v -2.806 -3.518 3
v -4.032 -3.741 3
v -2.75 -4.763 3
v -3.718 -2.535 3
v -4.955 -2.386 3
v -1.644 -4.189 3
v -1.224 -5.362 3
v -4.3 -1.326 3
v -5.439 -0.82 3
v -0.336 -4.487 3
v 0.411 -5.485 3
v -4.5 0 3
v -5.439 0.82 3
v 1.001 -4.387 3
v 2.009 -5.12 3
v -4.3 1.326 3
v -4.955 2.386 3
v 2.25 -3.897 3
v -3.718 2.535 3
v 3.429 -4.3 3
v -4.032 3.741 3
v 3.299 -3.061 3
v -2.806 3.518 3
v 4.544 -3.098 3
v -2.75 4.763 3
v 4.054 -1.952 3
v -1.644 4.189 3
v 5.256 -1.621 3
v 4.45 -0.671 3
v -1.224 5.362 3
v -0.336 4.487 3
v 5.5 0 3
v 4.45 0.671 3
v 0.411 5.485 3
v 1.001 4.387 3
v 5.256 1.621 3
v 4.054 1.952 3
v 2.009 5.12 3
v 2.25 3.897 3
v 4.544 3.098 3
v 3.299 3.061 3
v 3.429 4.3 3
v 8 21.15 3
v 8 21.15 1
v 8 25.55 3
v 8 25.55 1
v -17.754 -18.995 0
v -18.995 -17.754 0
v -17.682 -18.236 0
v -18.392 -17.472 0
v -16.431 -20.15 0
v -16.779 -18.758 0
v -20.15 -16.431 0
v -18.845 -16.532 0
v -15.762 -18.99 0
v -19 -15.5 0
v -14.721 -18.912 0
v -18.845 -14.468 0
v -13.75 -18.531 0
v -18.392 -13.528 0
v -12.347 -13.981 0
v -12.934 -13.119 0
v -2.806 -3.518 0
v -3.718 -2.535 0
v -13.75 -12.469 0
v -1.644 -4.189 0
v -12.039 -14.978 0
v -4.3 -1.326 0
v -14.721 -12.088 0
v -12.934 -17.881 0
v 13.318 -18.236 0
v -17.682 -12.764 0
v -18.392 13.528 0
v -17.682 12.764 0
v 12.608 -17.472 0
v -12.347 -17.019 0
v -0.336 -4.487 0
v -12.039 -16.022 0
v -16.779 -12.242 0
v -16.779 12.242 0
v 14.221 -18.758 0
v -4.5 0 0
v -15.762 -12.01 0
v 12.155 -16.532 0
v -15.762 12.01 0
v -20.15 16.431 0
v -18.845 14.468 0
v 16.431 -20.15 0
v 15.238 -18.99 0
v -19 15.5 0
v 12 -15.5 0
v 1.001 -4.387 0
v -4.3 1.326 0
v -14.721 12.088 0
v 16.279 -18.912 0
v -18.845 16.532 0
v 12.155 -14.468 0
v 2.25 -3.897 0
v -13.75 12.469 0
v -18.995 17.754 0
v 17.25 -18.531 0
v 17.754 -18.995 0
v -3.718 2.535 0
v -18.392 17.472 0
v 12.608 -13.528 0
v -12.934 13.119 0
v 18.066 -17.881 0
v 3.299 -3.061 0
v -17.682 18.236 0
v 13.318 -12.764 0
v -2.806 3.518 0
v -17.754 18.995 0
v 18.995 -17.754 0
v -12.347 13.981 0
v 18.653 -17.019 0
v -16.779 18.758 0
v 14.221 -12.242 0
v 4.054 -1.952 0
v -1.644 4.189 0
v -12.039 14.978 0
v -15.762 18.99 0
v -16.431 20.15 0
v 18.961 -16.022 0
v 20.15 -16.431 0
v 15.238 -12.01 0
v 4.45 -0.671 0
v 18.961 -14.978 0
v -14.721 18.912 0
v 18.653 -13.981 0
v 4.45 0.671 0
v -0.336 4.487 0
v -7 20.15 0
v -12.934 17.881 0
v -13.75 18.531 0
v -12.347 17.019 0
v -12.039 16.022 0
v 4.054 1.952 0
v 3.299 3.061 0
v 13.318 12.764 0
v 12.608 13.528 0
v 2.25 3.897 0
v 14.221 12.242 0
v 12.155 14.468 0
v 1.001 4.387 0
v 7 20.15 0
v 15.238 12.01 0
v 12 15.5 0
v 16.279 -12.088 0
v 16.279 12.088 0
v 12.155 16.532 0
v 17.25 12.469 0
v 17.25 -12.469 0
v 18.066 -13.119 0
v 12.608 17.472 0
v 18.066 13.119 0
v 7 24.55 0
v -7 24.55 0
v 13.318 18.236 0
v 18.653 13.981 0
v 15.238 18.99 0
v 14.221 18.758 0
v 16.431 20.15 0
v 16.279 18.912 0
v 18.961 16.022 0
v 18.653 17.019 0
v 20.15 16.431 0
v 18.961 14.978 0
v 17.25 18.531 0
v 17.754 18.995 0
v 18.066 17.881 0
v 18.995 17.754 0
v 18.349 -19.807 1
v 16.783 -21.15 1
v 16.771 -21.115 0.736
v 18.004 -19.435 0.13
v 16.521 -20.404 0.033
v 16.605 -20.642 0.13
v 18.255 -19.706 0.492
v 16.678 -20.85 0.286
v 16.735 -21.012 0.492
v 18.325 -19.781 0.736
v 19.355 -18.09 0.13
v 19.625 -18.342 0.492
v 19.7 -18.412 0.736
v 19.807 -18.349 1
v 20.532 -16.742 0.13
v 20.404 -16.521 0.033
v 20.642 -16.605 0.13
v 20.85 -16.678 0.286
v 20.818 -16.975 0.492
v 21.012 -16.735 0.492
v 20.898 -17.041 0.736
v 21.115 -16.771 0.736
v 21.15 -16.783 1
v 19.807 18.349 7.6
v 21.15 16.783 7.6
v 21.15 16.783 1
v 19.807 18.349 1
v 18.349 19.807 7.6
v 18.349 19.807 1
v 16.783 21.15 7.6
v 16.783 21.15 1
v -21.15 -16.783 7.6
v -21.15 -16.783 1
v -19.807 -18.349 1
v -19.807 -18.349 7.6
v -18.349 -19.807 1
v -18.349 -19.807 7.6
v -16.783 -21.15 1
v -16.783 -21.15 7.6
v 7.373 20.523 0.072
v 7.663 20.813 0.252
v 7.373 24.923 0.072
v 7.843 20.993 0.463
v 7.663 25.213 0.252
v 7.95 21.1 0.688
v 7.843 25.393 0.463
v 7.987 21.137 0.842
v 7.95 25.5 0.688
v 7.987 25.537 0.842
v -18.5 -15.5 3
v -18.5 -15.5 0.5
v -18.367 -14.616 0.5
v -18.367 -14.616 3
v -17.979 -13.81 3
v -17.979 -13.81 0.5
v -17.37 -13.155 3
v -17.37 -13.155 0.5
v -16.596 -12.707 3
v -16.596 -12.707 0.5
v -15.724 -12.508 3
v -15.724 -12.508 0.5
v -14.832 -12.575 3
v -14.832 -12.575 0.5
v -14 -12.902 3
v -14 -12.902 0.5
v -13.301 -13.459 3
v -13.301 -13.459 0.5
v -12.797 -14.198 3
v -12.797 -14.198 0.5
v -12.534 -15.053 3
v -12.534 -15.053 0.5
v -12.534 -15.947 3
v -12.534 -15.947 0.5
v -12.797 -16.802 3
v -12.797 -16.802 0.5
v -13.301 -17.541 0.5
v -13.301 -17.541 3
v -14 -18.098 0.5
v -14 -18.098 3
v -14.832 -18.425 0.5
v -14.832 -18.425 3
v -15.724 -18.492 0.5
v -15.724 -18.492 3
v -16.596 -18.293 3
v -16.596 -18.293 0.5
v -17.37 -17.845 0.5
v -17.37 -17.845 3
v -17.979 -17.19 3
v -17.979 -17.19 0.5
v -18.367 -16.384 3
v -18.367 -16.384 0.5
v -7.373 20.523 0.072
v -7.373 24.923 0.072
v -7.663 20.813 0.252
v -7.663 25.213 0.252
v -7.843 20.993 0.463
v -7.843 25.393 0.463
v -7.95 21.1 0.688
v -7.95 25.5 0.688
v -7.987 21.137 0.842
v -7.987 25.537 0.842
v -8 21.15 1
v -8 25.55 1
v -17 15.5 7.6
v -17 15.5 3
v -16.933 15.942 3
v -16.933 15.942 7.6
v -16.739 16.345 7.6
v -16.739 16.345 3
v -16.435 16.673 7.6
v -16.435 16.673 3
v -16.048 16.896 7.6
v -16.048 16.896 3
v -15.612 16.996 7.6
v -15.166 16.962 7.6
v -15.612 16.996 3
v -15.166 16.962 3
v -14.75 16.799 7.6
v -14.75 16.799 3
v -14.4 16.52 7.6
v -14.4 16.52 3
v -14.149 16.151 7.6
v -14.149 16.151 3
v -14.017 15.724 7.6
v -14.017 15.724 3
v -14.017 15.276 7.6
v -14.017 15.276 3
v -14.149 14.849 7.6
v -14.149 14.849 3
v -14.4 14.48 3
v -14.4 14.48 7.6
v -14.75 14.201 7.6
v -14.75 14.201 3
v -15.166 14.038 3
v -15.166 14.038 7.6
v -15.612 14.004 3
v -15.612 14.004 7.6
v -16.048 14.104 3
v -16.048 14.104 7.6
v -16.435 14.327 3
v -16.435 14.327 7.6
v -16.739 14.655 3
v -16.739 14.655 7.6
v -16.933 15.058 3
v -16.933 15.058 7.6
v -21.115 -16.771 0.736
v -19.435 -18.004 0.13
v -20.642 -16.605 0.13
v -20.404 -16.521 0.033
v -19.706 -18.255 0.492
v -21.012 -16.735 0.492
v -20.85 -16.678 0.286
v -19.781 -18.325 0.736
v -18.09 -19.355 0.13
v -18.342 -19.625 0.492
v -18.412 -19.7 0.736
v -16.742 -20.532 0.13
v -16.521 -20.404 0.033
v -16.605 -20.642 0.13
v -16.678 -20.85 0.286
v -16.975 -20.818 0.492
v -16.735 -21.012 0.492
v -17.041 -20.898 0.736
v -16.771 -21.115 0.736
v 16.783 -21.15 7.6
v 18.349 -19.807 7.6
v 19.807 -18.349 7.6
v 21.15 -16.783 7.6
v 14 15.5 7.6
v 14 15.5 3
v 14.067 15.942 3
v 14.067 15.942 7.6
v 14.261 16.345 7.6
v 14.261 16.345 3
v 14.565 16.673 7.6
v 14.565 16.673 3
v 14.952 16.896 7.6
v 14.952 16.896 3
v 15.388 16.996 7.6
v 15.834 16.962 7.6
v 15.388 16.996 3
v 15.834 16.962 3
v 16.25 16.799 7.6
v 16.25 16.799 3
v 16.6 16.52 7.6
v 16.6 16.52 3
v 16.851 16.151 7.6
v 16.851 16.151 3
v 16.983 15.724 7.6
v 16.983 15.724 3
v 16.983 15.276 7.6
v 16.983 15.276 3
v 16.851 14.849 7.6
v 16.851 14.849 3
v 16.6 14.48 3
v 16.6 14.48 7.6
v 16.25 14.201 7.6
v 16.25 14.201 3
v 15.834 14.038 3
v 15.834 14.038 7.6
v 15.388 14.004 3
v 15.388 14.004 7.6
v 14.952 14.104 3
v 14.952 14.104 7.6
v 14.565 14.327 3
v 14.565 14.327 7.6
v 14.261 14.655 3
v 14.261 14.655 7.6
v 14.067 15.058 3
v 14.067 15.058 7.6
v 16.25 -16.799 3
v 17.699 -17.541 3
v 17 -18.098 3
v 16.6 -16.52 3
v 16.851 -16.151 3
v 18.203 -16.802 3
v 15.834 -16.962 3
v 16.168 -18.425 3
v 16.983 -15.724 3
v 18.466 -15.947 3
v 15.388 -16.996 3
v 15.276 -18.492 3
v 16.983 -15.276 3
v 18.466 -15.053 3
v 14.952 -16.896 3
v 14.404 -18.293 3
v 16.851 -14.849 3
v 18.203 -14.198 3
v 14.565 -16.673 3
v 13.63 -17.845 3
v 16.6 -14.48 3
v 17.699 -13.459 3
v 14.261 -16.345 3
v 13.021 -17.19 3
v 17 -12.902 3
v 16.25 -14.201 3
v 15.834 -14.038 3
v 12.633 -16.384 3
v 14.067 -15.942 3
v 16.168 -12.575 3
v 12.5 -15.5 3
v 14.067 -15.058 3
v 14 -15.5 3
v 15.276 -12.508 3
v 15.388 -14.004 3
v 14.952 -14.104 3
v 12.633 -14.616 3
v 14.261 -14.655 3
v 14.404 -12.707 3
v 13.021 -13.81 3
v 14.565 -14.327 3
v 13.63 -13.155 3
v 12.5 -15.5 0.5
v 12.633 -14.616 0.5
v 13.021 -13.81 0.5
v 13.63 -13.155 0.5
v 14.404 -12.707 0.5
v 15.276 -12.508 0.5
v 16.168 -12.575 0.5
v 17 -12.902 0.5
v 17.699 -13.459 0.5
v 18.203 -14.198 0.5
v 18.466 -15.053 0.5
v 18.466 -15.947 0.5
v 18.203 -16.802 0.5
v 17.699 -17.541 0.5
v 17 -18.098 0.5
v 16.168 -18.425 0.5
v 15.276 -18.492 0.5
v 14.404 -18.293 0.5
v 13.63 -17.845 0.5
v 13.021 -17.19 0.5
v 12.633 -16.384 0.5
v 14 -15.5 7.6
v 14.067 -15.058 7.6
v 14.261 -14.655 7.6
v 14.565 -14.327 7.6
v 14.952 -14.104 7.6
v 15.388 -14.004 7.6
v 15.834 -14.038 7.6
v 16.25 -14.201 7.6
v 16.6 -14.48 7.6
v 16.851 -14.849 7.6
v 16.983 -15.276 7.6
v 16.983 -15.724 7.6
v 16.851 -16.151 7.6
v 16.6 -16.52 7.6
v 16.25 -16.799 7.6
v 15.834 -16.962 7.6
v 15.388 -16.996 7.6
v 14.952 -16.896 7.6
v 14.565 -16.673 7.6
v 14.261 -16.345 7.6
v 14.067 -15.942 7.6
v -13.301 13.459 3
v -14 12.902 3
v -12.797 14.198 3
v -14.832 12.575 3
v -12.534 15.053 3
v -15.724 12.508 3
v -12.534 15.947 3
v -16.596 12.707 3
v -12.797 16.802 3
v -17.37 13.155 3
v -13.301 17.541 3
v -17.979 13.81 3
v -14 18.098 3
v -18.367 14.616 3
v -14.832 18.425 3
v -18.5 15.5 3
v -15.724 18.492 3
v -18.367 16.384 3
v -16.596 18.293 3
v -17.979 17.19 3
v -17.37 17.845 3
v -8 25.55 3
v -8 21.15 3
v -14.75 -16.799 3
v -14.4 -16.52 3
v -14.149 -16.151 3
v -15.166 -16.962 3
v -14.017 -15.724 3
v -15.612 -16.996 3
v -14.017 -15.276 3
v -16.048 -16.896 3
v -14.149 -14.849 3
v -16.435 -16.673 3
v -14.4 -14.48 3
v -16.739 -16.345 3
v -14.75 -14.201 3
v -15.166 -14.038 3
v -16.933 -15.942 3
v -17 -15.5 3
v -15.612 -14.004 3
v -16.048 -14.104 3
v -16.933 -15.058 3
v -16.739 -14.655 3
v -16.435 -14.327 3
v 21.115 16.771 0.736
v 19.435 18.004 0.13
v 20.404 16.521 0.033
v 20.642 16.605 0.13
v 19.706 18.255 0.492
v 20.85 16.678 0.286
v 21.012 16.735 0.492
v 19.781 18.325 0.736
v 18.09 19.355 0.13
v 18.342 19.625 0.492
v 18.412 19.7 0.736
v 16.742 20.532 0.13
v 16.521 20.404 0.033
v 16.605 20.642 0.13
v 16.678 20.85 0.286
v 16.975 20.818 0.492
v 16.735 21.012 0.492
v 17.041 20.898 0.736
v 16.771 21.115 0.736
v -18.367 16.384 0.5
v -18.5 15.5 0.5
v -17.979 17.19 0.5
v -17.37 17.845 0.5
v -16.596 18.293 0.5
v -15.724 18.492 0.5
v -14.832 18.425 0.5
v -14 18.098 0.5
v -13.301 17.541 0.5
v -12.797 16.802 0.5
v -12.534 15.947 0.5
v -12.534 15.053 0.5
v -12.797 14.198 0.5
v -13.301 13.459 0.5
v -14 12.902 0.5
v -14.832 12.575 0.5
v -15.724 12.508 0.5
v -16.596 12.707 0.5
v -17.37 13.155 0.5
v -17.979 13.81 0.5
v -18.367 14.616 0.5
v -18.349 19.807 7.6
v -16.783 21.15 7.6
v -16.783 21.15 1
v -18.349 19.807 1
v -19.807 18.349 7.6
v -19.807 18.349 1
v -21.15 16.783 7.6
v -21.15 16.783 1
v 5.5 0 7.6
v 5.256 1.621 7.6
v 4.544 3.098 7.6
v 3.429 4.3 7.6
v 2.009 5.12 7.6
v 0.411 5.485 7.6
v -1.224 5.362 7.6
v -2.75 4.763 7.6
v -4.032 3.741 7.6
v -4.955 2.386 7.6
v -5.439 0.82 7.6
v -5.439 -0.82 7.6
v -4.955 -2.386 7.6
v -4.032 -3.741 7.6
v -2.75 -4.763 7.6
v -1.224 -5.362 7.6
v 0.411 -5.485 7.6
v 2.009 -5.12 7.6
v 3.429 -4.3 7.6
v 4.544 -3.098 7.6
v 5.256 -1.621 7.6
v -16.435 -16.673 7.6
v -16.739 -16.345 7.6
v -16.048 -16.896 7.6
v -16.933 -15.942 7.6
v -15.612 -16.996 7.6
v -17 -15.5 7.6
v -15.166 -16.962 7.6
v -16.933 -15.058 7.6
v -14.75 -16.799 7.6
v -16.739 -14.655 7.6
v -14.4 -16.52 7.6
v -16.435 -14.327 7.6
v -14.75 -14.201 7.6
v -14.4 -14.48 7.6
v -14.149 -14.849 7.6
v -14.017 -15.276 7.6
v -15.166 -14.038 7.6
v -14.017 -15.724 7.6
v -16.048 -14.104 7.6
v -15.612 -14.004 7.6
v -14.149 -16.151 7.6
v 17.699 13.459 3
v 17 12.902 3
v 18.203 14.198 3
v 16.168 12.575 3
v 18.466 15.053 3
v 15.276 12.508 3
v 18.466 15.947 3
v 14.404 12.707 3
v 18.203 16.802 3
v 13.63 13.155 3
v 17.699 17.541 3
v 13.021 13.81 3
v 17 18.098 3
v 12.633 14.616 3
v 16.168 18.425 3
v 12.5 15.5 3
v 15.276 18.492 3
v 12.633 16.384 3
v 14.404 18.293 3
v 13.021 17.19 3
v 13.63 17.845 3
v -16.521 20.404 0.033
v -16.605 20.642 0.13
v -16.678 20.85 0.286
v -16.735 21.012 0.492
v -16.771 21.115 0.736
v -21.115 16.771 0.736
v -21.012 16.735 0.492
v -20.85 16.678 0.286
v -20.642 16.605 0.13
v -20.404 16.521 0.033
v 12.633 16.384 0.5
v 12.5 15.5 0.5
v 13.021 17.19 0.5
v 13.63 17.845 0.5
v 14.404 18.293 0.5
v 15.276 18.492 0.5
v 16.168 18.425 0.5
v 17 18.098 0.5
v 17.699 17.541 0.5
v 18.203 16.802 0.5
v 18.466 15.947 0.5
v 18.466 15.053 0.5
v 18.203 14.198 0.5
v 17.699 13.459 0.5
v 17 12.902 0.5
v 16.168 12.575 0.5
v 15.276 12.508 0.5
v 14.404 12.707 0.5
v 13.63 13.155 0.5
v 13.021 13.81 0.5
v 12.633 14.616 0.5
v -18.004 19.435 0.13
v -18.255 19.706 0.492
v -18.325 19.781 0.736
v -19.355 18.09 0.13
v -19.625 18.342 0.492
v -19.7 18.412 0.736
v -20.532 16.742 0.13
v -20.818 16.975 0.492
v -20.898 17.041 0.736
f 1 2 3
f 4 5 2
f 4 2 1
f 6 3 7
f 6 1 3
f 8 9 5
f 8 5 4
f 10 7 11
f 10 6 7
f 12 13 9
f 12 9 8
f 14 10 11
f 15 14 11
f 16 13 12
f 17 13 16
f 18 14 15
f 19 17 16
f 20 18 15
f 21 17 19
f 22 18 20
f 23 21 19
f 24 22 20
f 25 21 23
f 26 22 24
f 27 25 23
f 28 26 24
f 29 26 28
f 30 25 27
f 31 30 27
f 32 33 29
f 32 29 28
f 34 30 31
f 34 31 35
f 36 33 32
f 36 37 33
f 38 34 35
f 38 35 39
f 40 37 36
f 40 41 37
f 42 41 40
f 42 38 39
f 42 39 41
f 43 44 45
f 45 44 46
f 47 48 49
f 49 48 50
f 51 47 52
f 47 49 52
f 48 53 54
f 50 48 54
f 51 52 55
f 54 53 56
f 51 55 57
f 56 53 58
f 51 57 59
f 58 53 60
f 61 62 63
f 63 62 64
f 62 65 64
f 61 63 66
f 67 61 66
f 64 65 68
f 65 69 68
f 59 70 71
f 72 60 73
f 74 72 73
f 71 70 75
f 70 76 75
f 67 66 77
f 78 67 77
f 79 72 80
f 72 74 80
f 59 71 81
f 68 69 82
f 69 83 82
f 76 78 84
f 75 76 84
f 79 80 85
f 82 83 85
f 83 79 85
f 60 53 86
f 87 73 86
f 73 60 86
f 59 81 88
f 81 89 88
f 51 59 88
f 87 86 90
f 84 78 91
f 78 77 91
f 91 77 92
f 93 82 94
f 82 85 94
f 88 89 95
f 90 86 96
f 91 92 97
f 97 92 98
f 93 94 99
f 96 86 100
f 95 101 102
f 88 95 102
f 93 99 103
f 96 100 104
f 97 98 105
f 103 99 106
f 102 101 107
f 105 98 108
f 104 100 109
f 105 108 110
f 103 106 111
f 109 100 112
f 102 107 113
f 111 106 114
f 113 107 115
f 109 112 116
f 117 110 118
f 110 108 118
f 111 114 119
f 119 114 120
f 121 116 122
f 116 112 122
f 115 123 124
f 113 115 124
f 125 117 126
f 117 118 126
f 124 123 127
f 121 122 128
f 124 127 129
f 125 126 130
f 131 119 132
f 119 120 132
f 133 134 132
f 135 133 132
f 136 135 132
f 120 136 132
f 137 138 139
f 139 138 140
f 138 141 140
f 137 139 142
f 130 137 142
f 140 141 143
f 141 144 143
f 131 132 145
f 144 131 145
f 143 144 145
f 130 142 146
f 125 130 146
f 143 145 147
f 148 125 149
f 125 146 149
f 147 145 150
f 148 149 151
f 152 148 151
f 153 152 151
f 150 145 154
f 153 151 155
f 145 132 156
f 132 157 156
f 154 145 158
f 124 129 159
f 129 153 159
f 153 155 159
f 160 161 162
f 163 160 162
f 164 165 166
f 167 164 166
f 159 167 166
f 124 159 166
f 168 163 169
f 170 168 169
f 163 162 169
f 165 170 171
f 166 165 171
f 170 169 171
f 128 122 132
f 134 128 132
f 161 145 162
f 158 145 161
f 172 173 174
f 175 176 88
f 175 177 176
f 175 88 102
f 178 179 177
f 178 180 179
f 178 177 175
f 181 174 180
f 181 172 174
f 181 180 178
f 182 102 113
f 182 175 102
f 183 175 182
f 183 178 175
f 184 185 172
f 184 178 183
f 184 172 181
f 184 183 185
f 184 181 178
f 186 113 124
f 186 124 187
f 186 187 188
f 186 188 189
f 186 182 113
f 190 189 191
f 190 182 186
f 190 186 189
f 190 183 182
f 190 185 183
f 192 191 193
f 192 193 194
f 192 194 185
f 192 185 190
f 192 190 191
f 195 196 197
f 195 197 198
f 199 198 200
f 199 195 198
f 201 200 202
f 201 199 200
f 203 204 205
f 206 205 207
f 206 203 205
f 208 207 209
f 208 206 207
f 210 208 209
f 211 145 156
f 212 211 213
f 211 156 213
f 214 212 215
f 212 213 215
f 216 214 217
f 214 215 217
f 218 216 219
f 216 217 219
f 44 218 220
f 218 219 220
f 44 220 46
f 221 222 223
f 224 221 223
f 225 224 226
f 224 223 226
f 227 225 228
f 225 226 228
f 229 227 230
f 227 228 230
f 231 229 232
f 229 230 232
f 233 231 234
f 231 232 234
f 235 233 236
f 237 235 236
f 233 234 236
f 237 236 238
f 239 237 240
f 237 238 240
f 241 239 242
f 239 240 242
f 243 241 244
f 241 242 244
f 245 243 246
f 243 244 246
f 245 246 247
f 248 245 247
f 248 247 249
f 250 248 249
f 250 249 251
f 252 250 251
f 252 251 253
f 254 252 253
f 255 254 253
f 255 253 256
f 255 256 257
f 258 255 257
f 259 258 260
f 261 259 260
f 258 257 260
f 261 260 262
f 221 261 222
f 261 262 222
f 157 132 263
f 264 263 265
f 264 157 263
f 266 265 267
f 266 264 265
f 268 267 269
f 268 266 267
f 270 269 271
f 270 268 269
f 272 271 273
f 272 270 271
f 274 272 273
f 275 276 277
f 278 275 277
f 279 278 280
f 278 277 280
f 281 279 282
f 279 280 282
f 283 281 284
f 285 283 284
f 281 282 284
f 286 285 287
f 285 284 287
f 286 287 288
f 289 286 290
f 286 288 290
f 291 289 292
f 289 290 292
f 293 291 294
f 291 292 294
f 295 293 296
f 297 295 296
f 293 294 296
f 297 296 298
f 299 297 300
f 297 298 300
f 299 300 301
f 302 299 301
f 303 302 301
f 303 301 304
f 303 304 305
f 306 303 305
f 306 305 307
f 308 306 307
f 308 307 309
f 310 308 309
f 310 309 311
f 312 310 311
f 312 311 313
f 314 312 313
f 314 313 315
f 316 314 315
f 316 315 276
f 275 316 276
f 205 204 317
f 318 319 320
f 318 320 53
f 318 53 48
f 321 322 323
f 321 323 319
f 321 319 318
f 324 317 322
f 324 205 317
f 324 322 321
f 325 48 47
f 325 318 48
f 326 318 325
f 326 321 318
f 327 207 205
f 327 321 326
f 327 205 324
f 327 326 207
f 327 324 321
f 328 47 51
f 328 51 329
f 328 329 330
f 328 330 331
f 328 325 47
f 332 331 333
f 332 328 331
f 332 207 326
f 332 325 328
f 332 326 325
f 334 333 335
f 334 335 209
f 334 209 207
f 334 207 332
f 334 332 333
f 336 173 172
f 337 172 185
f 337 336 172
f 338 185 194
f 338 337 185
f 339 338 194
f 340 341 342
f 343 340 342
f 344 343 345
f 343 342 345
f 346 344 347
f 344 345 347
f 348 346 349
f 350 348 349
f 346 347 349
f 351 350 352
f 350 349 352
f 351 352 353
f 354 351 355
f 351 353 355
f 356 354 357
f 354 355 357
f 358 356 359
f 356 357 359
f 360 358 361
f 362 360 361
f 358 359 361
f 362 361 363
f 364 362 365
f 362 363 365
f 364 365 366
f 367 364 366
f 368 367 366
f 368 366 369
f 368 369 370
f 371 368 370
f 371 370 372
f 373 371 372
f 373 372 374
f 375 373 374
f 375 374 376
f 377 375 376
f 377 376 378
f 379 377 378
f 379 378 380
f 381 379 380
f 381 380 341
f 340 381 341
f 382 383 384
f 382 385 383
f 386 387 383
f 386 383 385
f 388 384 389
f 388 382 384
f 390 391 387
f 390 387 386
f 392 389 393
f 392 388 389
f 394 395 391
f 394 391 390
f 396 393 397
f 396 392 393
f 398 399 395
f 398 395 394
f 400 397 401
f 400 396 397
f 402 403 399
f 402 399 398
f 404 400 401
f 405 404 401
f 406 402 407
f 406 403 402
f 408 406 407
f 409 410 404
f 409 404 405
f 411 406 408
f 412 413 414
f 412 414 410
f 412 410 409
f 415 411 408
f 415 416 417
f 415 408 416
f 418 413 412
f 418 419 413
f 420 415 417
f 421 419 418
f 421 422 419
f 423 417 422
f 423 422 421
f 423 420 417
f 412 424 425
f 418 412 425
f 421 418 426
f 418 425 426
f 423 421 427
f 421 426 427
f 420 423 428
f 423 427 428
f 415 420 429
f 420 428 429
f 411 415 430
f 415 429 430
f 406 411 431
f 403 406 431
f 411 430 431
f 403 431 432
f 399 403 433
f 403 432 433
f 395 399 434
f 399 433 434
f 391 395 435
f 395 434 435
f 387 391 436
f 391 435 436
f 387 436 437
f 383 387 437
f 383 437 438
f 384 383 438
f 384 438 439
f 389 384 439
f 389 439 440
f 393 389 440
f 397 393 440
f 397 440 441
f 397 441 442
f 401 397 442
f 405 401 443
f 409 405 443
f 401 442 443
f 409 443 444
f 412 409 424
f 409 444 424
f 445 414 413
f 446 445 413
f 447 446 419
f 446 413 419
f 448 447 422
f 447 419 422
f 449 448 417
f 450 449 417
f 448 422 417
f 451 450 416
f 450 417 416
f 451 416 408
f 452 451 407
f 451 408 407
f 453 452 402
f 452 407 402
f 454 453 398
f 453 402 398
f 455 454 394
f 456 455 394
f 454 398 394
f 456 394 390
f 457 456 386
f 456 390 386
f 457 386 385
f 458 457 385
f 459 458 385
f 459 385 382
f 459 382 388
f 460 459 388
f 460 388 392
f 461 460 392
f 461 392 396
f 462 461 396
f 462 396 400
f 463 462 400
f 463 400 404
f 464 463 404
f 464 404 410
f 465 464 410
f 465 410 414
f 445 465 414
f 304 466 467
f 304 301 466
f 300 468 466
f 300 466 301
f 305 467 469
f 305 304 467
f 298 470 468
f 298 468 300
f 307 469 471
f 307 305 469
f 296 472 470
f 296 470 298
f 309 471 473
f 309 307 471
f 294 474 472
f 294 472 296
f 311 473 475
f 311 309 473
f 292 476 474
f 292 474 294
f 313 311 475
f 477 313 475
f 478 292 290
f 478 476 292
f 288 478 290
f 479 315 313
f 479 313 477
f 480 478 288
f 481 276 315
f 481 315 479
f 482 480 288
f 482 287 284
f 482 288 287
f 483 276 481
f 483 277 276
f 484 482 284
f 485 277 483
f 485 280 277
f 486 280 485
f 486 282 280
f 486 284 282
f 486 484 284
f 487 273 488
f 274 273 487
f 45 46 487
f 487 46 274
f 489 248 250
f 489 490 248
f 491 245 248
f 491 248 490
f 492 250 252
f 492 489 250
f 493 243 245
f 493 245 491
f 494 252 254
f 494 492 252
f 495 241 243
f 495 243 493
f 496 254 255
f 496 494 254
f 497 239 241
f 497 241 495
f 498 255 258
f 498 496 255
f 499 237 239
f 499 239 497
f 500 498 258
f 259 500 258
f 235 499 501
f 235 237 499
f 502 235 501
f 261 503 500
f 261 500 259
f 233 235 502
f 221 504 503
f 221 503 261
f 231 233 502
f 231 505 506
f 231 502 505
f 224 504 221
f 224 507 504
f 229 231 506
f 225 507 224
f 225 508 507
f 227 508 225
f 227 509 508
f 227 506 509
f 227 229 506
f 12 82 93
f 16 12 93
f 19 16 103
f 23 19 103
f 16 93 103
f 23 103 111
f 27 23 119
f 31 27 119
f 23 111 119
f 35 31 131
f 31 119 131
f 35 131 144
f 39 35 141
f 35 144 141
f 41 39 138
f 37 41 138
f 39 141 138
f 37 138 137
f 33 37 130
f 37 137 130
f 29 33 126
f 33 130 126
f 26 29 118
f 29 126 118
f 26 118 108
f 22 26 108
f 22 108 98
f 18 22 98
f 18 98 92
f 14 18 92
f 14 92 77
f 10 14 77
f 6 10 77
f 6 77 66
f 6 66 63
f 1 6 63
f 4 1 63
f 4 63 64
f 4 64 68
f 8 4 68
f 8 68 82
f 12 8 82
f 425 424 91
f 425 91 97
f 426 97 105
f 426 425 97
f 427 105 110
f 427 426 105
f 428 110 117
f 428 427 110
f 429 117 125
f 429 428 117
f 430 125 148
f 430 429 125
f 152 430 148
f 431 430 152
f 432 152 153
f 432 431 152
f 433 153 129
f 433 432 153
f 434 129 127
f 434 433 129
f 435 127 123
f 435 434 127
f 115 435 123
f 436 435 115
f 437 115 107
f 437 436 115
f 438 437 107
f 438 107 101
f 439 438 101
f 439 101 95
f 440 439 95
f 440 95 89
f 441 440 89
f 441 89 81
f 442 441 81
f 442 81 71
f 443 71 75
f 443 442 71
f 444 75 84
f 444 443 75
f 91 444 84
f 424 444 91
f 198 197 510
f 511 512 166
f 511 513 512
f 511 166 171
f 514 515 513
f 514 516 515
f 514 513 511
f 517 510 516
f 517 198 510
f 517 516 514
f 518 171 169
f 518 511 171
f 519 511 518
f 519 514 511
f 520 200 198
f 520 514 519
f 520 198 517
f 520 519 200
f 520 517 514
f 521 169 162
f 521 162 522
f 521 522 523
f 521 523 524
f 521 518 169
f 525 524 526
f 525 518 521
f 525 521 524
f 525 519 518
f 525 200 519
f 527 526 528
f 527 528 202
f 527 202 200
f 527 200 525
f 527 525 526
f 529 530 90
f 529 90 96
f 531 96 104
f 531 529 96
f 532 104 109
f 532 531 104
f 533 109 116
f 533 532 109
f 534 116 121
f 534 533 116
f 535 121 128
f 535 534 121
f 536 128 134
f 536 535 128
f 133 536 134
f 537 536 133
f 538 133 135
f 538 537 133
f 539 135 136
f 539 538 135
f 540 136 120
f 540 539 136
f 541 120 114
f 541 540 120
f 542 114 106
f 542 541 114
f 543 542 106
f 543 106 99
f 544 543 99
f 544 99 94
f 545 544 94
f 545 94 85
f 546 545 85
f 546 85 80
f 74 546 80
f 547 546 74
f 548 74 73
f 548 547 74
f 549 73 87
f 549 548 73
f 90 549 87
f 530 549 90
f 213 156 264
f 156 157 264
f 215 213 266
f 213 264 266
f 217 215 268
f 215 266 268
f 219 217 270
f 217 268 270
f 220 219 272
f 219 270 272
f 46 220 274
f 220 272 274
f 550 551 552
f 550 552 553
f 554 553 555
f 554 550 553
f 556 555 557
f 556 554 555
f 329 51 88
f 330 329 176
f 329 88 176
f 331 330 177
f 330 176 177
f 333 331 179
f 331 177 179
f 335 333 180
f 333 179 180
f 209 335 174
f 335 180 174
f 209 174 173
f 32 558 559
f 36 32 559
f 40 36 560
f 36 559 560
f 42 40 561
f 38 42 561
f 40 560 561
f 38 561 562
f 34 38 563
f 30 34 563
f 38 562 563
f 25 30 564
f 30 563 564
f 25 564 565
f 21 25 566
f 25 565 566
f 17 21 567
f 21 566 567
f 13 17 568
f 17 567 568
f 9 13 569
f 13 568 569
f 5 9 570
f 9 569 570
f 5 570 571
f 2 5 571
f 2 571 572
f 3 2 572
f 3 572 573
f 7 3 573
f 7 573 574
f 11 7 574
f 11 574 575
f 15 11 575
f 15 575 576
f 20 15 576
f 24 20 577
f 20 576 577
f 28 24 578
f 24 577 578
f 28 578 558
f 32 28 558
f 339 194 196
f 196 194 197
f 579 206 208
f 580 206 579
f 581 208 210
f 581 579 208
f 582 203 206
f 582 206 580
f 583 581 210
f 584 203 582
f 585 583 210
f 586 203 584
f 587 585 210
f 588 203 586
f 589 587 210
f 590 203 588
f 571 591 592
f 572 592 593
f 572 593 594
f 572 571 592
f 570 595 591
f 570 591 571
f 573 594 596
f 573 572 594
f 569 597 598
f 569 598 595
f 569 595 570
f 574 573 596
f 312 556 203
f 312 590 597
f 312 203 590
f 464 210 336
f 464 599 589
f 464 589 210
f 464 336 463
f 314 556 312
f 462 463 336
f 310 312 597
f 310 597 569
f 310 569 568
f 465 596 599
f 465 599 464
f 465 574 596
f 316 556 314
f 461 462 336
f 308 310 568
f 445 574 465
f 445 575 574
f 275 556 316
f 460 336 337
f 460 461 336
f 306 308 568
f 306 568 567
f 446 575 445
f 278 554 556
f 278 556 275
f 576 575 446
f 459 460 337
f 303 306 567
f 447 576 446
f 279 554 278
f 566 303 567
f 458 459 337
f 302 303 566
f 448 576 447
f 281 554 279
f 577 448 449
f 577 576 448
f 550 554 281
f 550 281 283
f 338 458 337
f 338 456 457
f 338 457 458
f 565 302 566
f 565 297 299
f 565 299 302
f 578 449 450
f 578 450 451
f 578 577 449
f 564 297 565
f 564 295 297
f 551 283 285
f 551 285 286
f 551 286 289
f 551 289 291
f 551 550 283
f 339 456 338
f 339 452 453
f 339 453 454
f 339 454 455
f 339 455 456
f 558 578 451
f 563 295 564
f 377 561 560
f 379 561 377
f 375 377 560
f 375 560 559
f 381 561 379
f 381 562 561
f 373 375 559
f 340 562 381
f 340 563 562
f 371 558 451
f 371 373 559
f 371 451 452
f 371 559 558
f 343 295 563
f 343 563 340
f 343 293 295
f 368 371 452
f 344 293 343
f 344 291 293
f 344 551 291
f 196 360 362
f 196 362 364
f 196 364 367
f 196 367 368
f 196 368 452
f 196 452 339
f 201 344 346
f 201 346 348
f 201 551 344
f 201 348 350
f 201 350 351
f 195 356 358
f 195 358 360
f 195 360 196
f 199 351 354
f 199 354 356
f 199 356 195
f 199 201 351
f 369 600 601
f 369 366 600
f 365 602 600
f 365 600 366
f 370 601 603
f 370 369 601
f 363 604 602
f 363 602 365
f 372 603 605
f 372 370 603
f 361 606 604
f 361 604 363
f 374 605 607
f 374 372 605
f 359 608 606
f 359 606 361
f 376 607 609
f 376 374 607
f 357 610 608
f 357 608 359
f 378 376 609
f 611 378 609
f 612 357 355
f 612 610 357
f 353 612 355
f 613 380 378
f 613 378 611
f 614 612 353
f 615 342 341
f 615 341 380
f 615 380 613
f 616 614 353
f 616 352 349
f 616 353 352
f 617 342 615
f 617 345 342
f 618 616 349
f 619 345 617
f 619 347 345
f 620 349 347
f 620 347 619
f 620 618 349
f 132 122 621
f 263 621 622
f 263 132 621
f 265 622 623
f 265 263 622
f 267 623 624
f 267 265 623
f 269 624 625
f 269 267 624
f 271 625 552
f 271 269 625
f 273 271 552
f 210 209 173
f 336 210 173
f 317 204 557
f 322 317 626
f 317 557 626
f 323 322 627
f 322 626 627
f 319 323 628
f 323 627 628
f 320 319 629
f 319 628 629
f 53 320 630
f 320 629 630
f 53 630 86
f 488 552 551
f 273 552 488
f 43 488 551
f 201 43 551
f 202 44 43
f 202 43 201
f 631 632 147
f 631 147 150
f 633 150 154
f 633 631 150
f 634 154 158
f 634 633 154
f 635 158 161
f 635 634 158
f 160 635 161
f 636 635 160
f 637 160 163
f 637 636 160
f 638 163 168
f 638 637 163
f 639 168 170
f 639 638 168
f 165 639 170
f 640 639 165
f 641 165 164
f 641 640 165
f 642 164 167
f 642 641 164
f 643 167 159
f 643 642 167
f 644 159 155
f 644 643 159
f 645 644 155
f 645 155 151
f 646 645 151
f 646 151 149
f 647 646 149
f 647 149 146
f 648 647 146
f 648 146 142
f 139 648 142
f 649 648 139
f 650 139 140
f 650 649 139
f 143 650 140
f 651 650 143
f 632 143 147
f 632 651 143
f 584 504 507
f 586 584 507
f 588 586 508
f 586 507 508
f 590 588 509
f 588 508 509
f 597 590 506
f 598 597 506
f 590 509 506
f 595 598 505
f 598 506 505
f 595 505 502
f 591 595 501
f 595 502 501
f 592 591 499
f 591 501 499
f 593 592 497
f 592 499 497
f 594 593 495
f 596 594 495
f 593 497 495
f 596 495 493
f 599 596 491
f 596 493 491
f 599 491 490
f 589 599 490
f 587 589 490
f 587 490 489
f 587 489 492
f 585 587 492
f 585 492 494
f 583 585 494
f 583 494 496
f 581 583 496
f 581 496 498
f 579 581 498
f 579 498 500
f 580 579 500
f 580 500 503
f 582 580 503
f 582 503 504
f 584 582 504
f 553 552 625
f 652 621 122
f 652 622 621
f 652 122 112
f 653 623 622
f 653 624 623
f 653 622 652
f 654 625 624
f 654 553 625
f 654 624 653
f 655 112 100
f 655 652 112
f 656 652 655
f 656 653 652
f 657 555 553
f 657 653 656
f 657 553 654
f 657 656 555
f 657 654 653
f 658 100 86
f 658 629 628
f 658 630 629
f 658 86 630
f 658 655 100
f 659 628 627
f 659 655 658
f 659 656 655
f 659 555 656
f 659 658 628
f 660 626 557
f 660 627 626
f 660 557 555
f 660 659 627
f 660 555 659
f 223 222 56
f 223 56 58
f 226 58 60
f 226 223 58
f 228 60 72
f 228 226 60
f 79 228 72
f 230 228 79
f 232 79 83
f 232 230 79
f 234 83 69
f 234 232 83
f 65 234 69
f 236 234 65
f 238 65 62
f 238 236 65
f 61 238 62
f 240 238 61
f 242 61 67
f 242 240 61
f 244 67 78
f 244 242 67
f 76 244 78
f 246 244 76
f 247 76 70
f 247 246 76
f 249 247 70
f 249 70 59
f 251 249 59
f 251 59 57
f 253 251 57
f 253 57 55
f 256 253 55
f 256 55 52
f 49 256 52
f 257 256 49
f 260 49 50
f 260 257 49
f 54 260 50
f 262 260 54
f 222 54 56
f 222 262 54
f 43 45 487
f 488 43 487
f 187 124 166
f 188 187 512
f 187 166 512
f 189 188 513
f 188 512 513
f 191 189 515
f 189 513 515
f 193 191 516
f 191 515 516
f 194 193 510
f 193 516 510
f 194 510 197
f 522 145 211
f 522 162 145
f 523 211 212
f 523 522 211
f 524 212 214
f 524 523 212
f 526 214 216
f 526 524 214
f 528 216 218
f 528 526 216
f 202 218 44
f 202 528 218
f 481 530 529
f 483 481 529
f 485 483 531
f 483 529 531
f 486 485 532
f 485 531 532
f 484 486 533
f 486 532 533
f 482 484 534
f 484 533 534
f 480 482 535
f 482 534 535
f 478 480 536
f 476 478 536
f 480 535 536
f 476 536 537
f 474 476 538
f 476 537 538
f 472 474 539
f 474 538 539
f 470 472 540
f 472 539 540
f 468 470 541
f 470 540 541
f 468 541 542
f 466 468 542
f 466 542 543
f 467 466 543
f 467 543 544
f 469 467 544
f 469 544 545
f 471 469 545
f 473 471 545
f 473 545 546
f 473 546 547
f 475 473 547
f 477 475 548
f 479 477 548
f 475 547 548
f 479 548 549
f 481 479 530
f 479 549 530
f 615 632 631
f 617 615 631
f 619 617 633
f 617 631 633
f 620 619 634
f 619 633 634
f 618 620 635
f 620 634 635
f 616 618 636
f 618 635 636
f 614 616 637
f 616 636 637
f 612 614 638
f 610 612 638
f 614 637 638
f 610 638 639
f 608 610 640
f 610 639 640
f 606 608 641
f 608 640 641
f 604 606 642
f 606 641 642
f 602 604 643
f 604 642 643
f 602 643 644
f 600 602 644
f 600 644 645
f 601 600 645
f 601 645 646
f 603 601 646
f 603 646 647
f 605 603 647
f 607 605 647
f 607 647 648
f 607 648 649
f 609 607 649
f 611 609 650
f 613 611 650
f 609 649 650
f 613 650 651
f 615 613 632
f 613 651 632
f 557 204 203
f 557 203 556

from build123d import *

# Parameters (mm, degrees)
CROQUIS1_W            = 42.3
CROQUIS1_H            = 42.3
EXTRUDE_FEATURE_DEPTH = 7.6
SKETCH2_R             = 29.910616844
SKETCH2_R_2           = 27
CUT_EXTRUDE1_DEPTH    = 8.6
CROQUIS5_R            = 1.5
CORTAR_EXTRUIR2_DEPTH = 22
CROQUIS6_R            = 4.5
CORTAR_EXTRUIR3_DEPTH = 8.6
SKETCH3_R             = 5.5
CUT_EXTRUDE2_DEPTH    = 4.6
CROQUIS7_R            = 3
CORTAR_EXTRUIR4_DEPTH = 3
SKETCH1_W             = 16
SKETCH1_H             = 4.4
BOSS_EXTRUDE1_DEPTH   = 3
FILLET1_R             = 1
CHAMFER1_SIZE         = 0.5


with BuildPart() as part:
    # Croquis1 → Extrude Feature (new body)
    with BuildSketch(Plane.XY):
        Rectangle(CROQUIS1_W, CROQUIS1_H)
    extrude(amount=EXTRUDE_FEATURE_DEPTH)

    # Sketch2 → Cut-Extrude1 (cut, through all)
    with BuildSketch(Plane.XY.offset(7.6)):
        Circle(SKETCH2_R)
        Circle(SKETCH2_R_2, mode=Mode.SUBTRACT)
    extrude(amount=-CUT_EXTRUDE1_DEPTH, mode=Mode.SUBTRACT)

    # Croquis5 → Cortar-Extruir2 (cut)
    with BuildSketch(Plane(origin=(0, 0, 0), x_dir=(-1, 0, 0), z_dir=(0, 0, -1))):
        with Locations((-15.5, 15.5)):
            Circle(CROQUIS5_R)
        with Locations((15.5, 15.5)):
            Circle(CROQUIS5_R)
        with Locations((15.5, -15.5)):
            Circle(CROQUIS5_R)
        with Locations((-15.5, -15.5)):
            Circle(CROQUIS5_R)
    extrude(amount=-CORTAR_EXTRUIR2_DEPTH, mode=Mode.SUBTRACT)

    # Croquis6 → Cortar-Extruir3 (cut, through all)
    with BuildSketch(Plane(origin=(0, 0, 0), x_dir=(-1, 0, 0), z_dir=(0, 0, -1))):
        Circle(CROQUIS6_R)
    extrude(amount=-CORTAR_EXTRUIR3_DEPTH, mode=Mode.SUBTRACT)

    # Sketch3 → Cut-Extrude2 (cut)
    with BuildSketch(Plane.XY.offset(7.6)):
        Circle(SKETCH3_R)
    extrude(amount=-CUT_EXTRUDE2_DEPTH, mode=Mode.SUBTRACT)

    # Croquis7 → Cortar-Extruir4 (cut)
    with BuildSketch(Plane(origin=(0, 0, 0), x_dir=(-1, 0, 0), z_dir=(0, 0, -1))):
        with Locations((-15.5, 15.5)):
            Circle(CROQUIS7_R)
        with Locations((15.5, 15.5)):
            Circle(CROQUIS7_R)
        with Locations((15.5, -15.5)):
            Circle(CROQUIS7_R)
        with Locations((-15.5, -15.5)):
            Circle(CROQUIS7_R)
    extrude(amount=-CORTAR_EXTRUIR4_DEPTH, mode=Mode.SUBTRACT)

    # Sketch1 → Boss-Extrude1 (add)
    with BuildSketch(Plane(origin=(0, 0, 0), x_dir=(-1, 0, 0), z_dir=(0, 0, -1))):
        with Locations((0, 23.35)):
            Rectangle(SKETCH1_W, SKETCH1_H)
    extrude(amount=-BOSS_EXTRUDE1_DEPTH)

    # Fillet1
    fillet1_edges = [part.edges().sort_by_distance(p)[0] for p in [
        (-12.39162529, 21.15, 0),
        (-8, 23.35, 0),
        (0, 25.55, 0),
        (8, 23.35, 0),
        (21.15, 0, 0),
        (0, -21.15, 0),
        (-21.15, 0, 0),
        (12.39162529, 21.15, 0),
        (19.091883092, -19.091883092, 0),
        (-19.091883092, -19.091883092, 0),
        (-19.091883092, 19.091883092, 0),
        (19.091883092, 19.091883092, 0),
    ]]
    fillet(fillet1_edges, radius=FILLET1_R)

    # Chamfer1
    chamfer1_edges = [part.edges().sort_by_distance(p)[0] for p in [
        (18.5, 15.5, 0),
        (-12.5, 15.5, 0),
        (-12.5, -15.5, 0),
        (18.5, -15.5, 0),
    ]]
    chamfer(chamfer1_edges, length=CHAMFER1_SIZE)


solid = part.part
